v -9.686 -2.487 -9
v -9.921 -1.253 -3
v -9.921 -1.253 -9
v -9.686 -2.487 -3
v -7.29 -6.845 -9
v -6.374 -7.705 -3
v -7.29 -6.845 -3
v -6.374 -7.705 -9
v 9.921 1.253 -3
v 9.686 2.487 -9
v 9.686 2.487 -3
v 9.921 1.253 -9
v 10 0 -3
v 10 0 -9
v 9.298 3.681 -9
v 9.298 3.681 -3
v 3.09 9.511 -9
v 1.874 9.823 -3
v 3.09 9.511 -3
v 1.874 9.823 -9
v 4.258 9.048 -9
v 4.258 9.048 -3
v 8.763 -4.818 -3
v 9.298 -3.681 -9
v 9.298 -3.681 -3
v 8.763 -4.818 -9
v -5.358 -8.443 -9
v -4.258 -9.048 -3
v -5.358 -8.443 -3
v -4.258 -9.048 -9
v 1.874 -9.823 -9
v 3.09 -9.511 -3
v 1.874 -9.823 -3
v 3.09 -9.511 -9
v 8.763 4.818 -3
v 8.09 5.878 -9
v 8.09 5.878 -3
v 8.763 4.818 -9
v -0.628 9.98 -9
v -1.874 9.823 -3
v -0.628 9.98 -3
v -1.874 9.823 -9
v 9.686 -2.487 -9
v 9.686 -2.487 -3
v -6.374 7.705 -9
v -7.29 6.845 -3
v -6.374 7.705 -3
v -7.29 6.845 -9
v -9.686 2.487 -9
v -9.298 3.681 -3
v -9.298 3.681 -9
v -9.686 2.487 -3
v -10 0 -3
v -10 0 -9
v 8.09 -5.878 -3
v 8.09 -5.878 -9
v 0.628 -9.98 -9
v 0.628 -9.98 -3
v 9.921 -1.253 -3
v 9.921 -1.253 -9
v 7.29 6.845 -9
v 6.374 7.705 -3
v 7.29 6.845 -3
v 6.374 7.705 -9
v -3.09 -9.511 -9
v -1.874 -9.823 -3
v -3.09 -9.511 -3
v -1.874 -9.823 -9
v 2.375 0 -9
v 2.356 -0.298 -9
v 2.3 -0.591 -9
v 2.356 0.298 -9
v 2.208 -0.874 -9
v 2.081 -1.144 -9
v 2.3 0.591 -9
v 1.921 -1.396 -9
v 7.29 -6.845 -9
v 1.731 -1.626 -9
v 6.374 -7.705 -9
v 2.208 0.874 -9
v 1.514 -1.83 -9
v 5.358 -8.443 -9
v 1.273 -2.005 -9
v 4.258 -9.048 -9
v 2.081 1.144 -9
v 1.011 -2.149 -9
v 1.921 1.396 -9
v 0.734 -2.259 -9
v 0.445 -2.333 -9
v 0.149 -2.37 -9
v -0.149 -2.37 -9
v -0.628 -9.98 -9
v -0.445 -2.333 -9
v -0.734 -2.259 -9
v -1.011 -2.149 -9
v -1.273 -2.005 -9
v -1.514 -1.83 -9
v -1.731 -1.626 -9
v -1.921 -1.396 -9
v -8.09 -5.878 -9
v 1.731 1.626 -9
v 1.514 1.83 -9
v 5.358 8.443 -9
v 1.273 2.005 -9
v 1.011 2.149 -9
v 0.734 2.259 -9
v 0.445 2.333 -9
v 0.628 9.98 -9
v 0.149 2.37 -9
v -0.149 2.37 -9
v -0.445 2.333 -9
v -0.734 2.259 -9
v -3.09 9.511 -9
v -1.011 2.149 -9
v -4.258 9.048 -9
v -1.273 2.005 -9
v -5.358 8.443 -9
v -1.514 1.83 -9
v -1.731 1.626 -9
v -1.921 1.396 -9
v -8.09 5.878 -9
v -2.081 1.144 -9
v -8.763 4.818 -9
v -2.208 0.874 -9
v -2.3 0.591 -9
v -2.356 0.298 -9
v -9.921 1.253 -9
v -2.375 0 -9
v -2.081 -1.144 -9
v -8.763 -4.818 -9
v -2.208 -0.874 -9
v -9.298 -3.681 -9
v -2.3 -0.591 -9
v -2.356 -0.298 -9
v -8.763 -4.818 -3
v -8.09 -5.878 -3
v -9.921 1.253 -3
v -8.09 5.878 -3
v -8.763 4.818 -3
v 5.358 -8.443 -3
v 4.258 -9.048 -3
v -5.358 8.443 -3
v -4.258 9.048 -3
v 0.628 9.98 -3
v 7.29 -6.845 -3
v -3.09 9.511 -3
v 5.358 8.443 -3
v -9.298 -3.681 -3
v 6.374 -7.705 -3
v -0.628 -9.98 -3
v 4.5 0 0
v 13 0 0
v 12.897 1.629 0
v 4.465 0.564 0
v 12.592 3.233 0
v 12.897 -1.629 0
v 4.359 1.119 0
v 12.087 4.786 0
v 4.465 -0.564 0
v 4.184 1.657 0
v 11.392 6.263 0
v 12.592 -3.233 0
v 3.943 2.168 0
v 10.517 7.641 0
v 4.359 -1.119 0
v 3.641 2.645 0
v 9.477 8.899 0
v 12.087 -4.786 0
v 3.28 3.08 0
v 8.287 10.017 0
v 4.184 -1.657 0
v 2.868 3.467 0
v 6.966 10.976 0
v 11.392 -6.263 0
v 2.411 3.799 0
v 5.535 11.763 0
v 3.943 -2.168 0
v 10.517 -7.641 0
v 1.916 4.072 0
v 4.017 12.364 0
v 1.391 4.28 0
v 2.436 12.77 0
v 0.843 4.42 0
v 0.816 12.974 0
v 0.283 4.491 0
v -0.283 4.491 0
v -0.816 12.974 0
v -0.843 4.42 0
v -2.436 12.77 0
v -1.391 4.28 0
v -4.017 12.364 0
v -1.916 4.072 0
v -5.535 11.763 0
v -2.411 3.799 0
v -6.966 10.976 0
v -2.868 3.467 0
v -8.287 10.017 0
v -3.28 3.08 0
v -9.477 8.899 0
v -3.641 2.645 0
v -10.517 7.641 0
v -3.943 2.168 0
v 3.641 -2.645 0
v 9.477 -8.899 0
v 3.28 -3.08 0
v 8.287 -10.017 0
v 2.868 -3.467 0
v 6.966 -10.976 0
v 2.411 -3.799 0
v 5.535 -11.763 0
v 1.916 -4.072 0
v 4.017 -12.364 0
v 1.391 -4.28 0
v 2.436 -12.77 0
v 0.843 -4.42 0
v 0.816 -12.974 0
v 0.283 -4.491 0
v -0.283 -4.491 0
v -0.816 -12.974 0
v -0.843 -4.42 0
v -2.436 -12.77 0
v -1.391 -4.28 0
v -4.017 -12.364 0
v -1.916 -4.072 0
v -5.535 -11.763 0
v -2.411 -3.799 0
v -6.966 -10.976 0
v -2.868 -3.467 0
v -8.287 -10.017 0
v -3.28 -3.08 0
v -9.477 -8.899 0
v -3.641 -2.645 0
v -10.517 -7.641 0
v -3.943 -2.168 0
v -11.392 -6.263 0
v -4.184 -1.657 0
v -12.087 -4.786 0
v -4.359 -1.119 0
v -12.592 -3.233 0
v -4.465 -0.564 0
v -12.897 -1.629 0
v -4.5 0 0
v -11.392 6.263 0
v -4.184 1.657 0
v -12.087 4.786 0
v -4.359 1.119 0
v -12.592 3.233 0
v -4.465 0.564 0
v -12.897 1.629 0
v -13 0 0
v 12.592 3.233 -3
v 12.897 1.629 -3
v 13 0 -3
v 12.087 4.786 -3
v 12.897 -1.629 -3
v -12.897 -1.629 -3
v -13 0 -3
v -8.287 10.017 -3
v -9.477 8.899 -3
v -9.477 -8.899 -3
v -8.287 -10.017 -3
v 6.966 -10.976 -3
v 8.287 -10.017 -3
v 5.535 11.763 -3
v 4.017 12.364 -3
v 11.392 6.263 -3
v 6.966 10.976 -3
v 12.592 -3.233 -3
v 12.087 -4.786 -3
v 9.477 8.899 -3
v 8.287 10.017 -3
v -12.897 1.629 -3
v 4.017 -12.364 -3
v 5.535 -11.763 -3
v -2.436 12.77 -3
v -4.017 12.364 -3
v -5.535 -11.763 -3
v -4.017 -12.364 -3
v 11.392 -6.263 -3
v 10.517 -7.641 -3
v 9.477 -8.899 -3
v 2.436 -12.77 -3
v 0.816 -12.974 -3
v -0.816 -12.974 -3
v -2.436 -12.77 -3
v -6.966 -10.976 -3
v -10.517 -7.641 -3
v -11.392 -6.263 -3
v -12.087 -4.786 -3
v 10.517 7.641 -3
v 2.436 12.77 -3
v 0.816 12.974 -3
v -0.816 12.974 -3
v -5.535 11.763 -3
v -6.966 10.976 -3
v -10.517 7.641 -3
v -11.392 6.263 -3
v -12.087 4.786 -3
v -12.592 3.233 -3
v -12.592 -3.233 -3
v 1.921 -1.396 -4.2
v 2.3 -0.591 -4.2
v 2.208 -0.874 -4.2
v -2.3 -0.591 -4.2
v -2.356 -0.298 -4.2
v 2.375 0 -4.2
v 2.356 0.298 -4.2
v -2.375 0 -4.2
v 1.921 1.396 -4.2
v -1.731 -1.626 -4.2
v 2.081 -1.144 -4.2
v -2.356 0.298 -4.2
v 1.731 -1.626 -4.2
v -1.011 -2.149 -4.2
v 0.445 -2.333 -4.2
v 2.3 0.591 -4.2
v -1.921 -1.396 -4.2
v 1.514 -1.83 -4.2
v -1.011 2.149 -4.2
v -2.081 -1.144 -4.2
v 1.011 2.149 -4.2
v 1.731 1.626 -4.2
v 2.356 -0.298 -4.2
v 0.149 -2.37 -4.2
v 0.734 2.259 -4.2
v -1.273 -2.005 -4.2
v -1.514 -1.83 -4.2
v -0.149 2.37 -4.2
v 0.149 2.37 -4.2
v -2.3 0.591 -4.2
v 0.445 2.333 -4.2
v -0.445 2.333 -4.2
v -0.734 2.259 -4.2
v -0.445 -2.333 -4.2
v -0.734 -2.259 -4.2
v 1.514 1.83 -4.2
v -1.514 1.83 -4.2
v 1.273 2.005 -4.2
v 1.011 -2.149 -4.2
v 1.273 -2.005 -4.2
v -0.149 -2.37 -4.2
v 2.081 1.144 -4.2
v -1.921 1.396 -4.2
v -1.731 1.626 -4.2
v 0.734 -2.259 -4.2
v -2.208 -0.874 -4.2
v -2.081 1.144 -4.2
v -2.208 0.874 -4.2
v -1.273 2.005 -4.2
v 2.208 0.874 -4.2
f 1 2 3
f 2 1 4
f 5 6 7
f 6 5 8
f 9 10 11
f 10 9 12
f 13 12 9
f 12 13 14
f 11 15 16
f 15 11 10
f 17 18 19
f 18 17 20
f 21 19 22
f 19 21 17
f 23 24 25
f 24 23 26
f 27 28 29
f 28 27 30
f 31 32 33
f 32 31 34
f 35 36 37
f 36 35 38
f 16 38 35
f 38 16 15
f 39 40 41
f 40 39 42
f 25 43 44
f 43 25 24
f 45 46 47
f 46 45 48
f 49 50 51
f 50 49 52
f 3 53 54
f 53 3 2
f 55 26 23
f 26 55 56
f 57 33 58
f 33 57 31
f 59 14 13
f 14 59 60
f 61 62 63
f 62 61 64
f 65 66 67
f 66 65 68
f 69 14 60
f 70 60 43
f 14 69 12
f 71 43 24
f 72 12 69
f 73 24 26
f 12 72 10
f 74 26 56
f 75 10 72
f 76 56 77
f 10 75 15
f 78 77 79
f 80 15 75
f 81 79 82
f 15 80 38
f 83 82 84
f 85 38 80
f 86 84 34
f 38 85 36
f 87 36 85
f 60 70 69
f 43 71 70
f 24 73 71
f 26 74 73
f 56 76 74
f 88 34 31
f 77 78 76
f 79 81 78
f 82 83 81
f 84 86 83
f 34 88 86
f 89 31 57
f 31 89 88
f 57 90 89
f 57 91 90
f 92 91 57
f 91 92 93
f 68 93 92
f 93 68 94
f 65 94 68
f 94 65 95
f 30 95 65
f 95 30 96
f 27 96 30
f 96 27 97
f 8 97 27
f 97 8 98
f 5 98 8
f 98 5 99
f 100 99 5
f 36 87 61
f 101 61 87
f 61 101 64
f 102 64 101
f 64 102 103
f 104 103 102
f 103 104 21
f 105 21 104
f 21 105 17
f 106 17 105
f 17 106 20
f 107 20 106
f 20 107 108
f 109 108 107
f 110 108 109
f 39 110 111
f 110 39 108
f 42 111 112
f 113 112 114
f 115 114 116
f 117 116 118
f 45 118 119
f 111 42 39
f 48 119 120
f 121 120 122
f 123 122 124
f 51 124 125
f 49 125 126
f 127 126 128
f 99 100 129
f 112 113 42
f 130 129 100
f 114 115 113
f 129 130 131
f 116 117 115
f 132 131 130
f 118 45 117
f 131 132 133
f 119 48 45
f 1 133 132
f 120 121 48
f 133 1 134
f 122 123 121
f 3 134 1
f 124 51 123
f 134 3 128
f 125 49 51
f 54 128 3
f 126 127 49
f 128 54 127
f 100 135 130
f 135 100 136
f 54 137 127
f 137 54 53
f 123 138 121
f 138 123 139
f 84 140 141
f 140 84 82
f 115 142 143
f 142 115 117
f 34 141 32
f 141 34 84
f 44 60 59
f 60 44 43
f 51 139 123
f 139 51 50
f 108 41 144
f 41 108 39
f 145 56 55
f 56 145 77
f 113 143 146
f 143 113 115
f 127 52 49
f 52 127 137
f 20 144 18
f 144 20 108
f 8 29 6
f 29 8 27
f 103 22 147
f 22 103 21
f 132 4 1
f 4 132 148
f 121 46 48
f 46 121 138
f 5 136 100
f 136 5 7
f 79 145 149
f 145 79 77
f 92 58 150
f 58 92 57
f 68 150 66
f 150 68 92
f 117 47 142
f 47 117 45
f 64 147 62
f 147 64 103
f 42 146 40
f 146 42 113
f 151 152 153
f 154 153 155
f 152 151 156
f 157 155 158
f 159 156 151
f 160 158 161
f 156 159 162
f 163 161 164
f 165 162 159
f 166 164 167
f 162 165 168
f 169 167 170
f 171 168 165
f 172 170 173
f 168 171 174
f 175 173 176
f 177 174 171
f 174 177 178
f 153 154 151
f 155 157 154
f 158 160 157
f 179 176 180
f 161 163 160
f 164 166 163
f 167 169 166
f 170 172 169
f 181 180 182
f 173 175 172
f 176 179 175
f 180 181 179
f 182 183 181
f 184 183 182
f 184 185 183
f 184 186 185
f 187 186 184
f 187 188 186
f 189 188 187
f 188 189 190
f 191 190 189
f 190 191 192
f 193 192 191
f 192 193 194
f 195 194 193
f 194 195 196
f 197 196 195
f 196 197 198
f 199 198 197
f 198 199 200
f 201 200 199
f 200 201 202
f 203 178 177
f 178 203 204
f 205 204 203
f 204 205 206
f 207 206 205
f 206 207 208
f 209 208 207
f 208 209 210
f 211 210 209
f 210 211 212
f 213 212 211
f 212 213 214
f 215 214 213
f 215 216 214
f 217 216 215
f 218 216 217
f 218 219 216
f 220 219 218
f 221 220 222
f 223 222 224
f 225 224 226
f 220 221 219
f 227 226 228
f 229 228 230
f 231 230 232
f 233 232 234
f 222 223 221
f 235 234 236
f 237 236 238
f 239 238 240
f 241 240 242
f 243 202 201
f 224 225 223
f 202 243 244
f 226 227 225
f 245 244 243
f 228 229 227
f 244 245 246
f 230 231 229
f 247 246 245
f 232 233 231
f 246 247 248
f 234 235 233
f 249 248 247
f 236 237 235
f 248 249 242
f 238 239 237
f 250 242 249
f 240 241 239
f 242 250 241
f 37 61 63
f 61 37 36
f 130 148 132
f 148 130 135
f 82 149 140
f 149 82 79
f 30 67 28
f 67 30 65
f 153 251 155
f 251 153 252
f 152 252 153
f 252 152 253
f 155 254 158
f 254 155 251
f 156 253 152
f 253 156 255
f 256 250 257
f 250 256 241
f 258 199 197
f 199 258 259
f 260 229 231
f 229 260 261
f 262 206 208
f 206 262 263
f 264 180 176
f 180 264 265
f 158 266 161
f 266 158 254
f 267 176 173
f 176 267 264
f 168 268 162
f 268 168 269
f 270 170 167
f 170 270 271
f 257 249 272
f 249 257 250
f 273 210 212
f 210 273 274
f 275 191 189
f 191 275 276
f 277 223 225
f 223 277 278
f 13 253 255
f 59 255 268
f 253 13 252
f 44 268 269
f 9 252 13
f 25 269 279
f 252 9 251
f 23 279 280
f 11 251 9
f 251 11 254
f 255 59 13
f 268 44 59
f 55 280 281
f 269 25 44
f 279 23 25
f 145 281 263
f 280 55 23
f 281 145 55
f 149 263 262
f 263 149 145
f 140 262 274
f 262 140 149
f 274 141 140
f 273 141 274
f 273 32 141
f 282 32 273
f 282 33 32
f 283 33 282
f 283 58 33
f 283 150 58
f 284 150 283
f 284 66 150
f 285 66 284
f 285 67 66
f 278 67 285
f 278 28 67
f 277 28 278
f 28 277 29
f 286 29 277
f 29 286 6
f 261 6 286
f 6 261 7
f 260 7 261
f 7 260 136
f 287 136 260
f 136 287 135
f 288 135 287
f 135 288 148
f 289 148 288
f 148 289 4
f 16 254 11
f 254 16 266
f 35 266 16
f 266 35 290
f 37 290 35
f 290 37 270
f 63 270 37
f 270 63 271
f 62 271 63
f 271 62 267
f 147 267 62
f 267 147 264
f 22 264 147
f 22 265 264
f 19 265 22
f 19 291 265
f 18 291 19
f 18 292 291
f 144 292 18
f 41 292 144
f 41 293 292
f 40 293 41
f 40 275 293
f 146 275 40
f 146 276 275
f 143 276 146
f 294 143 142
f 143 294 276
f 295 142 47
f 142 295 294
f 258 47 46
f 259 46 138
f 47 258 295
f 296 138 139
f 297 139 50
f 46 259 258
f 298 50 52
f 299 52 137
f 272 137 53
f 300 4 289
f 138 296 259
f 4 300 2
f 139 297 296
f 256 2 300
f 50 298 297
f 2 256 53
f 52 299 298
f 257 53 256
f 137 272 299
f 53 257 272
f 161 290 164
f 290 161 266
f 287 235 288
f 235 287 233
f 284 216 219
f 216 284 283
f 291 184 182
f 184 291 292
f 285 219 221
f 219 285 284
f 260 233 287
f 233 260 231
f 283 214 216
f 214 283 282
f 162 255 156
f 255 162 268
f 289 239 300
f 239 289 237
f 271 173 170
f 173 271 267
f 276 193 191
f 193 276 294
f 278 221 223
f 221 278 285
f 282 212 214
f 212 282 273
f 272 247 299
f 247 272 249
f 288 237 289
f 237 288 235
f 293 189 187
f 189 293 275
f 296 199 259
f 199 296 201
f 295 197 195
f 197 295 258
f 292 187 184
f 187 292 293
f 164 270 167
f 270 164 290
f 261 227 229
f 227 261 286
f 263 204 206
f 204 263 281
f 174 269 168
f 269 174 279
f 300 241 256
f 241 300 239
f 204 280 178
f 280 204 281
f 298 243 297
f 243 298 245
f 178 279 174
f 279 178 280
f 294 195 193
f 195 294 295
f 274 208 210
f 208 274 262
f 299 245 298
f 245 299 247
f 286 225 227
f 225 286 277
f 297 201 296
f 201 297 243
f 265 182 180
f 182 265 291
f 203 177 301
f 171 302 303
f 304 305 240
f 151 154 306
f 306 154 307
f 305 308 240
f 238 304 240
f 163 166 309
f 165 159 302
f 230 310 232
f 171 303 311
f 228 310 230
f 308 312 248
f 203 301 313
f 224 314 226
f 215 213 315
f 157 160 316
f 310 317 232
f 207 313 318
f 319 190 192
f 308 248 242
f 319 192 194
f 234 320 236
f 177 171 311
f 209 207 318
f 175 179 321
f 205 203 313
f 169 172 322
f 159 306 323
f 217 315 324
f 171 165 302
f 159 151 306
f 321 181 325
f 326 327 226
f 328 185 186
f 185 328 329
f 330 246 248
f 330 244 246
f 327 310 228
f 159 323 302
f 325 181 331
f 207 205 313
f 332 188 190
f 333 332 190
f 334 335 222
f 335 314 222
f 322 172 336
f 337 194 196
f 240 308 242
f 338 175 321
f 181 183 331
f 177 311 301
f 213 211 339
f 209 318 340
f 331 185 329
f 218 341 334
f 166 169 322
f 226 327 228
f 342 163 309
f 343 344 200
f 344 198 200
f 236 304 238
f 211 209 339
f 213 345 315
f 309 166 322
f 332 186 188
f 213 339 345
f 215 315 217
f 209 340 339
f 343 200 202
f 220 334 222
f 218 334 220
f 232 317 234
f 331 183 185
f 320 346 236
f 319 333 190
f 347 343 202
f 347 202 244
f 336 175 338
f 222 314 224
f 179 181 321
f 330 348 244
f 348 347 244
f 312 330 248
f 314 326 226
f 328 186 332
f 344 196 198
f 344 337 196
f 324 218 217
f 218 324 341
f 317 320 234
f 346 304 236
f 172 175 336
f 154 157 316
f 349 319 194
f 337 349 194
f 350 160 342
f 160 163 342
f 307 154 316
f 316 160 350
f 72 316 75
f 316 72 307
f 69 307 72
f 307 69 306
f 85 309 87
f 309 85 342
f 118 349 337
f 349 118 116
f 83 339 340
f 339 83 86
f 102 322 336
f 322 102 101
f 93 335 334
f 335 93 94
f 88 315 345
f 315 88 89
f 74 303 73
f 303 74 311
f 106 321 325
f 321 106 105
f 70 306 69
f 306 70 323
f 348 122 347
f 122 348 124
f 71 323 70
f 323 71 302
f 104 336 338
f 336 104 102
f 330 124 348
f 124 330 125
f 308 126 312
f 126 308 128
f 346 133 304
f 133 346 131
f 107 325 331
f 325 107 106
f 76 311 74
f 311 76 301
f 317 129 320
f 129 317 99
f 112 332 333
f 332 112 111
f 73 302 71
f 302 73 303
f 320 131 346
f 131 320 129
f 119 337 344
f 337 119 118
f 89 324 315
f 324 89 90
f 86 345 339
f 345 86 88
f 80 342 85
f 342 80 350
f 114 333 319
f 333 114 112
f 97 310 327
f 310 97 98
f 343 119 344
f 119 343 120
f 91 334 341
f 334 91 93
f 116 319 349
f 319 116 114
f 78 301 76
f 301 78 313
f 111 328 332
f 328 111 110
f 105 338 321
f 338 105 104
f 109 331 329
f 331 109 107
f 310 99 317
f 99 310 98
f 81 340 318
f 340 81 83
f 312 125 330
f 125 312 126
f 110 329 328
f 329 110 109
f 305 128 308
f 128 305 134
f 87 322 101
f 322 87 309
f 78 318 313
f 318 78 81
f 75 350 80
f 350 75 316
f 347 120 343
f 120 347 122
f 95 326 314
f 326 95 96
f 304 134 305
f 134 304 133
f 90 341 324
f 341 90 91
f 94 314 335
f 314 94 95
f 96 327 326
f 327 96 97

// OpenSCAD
$fn = 50;


difference() {
	union() {
		translate(v = [0, 0, -9.0000000000]) {
			cylinder(h = 9, r = 10.0000000000);
		}
		translate(v = [0, 0, -3.0000000000]) {
			cylinder(h = 3, r = 13.0000000000);
		}
	}
	union() {
		translate(v = [0, 0, 0]) {
			rotate(a = [0, 0, 0]) {
				difference() {
					union() {
						#translate(v = [0, 0, -9.0000000000]) {
							cylinder(h = 9, r = 2.2500000000);
						}
						#translate(v = [0, 0, -4.2000000000]) {
							cylinder(h = 4.2000000000, r = 10.0000000000, r1 = 2.3750000000, r2 = 4.5000000000);
						}
						#translate(v = [0, 0, -9.0000000000]) {
							cylinder(h = 9, r = 2.3750000000);
						}
						#translate(v = [0, 0, -9.0000000000]) {
							cylinder(h = 9, r = 2.2500000000);
						}
					}
					union();
				}
			}
		}
	}
}
